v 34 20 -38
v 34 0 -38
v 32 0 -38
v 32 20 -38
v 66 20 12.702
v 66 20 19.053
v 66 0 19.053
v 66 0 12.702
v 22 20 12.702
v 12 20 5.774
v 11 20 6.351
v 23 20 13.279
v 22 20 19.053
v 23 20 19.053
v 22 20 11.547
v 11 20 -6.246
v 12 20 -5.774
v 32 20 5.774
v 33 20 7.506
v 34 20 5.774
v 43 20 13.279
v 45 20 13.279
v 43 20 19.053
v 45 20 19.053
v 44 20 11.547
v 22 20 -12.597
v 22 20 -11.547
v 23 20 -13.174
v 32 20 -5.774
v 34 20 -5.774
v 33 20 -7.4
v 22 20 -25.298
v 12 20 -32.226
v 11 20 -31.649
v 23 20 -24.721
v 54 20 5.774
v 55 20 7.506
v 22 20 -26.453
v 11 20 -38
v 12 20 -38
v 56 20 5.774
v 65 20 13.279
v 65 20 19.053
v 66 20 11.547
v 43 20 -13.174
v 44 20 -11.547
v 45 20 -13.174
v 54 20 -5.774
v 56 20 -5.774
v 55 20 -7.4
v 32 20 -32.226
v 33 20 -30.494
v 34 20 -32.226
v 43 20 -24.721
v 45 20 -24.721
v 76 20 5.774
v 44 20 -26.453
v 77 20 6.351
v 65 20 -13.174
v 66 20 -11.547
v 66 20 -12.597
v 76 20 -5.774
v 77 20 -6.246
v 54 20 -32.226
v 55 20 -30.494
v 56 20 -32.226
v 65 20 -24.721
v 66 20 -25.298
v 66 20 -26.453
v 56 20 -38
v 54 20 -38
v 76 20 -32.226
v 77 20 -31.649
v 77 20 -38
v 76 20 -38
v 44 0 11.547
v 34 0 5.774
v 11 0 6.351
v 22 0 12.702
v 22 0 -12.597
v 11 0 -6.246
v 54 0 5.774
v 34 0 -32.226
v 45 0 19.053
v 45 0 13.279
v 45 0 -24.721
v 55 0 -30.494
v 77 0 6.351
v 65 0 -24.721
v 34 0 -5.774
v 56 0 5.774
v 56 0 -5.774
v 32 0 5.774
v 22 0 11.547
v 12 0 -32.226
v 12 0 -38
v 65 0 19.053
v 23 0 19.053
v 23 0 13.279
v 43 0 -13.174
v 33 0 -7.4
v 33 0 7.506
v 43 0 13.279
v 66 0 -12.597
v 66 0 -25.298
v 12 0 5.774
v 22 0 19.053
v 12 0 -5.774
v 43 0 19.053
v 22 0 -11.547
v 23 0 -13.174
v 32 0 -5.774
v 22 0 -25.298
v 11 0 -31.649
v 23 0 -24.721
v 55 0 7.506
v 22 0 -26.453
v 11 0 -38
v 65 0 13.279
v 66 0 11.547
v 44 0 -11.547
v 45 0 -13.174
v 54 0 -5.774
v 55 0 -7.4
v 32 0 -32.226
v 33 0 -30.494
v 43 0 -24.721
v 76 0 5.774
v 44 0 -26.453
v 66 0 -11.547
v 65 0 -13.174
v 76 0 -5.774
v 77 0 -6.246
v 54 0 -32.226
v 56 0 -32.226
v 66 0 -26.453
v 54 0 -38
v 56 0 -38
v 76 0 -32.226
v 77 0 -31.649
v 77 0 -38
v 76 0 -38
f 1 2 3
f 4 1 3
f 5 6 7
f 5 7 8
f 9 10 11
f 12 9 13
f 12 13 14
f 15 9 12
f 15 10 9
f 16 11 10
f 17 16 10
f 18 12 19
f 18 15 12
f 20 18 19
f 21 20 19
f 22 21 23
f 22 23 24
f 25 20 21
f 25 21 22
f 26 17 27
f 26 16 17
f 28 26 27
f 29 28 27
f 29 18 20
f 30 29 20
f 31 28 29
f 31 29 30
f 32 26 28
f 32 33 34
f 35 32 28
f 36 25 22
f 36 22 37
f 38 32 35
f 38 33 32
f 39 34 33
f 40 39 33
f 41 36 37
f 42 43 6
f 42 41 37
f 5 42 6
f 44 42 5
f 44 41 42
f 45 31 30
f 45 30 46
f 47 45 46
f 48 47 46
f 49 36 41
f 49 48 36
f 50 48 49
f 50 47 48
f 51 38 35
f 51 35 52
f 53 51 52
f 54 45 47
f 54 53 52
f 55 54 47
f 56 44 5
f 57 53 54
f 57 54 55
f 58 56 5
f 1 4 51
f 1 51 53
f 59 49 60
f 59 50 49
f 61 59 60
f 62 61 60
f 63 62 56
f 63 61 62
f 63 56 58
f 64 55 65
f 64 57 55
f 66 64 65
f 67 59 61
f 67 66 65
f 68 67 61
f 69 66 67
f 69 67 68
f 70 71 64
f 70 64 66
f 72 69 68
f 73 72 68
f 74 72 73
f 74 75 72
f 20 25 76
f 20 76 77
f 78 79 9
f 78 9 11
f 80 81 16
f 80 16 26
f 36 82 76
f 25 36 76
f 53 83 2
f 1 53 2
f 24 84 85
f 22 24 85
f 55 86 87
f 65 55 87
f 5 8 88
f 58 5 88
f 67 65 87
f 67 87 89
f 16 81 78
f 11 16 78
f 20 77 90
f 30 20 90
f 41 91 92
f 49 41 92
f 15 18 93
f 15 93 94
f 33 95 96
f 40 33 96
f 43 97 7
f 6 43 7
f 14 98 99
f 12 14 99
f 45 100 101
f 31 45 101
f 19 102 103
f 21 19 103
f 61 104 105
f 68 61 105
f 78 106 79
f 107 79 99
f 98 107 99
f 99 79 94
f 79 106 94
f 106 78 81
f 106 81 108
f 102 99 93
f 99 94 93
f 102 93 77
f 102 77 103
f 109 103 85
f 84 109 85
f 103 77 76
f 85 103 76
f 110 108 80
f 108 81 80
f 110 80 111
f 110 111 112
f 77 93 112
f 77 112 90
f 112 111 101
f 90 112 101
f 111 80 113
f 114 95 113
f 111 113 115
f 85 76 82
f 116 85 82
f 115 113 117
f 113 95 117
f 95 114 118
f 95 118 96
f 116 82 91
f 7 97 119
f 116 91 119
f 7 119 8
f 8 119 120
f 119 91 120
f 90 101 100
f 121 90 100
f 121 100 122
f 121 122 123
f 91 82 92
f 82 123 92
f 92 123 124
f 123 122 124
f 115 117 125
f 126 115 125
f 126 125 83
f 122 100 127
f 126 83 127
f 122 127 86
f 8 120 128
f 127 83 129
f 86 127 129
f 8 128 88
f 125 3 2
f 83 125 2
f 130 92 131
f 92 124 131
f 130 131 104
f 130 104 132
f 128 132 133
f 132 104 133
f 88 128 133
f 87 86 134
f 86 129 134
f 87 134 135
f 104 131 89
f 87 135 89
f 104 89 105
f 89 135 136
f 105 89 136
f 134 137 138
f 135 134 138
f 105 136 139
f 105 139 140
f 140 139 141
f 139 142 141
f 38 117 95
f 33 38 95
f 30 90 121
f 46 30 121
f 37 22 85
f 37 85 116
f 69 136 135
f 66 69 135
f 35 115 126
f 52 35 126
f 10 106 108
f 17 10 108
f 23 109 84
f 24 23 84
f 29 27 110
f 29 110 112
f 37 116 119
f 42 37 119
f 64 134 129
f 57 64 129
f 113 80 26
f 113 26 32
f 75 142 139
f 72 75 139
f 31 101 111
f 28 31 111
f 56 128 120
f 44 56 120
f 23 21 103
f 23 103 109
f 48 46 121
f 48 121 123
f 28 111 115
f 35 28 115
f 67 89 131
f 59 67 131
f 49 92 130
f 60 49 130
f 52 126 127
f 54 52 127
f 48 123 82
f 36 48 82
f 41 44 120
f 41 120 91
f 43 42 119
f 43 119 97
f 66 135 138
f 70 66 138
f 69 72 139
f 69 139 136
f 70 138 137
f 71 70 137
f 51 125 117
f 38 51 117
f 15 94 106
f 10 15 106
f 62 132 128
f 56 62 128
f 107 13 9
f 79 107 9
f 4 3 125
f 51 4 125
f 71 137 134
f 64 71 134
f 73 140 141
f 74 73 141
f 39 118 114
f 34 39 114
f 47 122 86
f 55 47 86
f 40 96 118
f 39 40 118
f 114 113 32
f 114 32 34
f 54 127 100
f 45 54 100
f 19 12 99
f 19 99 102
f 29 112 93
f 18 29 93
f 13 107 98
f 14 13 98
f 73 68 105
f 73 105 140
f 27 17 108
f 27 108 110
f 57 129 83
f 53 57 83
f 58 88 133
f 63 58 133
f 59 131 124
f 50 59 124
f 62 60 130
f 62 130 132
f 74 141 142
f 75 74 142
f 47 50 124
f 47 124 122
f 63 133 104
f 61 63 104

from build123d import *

# Parameters (mm, degrees)
BOSS_EXTRUDE2_DEPTH = 20
CUT_EXTRUDE1_DEPTH  = 21


with BuildPart() as part:
    # Sketch1 → Boss-Extrude2 (new body)
    with BuildSketch(Plane(origin=(0, 0, 0), x_dir=(1, 0, 0), z_dir=(0, 1, 0))):
        Polygon((21, -13.279056191), (21, -19.052558883), (23, -19.052558883), (23, -13.279056191), (33, -7.505553499), (43, -13.279056191), (43, -19.052558883), (45, -19.052558883), (45, -13.279056191), (55, -7.505553499), (65, -13.279056191), (65, -19.052558883), (67, -19.052558883), (67, -13.279056191), (77, -7.505553499), (77, 7.400435733), (67, 13.173938425), (67, 24.720943809), (77, 30.494446501), (77, 38), (76, 38), (76, 32.226497308), (66, 26.452994616), (56, 32.226497308), (56, 38), (54, 38), (54, 32.226497308), (44, 26.452994616), (34, 32.226497308), (34, 38), (32, 38), (32, 32.226497308), (22, 26.452994616), (12, 32.226497308), (12, 38), (11, 38), (11, 30.494446501), (21, 24.720943809), (21, 13.173938425), (11, 7.400435733), (11, -7.505553499), align=None)
        Polygon((12, 5.773502692), (22, 11.547005384), (32, 5.773502692), (32, -5.773502692), (22, -11.547005384), (12, -5.773502692), align=None, mode=Mode.SUBTRACT)
        Polygon((34, 5.773502692), (44, 11.547005384), (54, 5.773502692), (54, -5.773502692), (44, -11.547005384), (34, -5.773502692), align=None, mode=Mode.SUBTRACT)
        Polygon((56, 5.773502692), (66, 11.547005384), (76, 5.773502692), (76, -5.773502692), (66, -11.547005384), (56, -5.773502692), align=None, mode=Mode.SUBTRACT)
        Polygon((43, 13.173938425), (33, 7.400435733), (23, 13.173938425), (23, 24.720943809), (33, 30.494446501), (43, 24.720943809), align=None, mode=Mode.SUBTRACT)
        Polygon((65, 13.173938425), (55, 7.400435733), (45, 13.173938425), (45, 24.720943809), (55, 30.494446501), (65, 24.720943809), align=None, mode=Mode.SUBTRACT)
    extrude(amount=BOSS_EXTRUDE2_DEPTH)

    # Sketch2 → Cut-Extrude1 (cut, through all)
    with BuildSketch(Plane(origin=(0, 20, 0), x_dir=(1, 0, 0), z_dir=(0, 1, 0))):
        Polygon((11, 6.245735195), (22, 12.596588156), (22, 25.298294078), (11, 31.649147039), (2.295872016, -19.052558883), (22, -19.052558883), (22, -12.701705922), (11, -6.350852961), align=None)
        Polygon((77, 31.649147039), (85.704127984, -19.052558883), (66, -19.052558883), (66, -12.701705922), (77, -6.350852961), (77, 6.245735195), (66, 12.596588156), (66, 25.298294078), align=None)
    extrude(amount=-CUT_EXTRUDE1_DEPTH, mode=Mode.SUBTRACT)


solid = part.part
